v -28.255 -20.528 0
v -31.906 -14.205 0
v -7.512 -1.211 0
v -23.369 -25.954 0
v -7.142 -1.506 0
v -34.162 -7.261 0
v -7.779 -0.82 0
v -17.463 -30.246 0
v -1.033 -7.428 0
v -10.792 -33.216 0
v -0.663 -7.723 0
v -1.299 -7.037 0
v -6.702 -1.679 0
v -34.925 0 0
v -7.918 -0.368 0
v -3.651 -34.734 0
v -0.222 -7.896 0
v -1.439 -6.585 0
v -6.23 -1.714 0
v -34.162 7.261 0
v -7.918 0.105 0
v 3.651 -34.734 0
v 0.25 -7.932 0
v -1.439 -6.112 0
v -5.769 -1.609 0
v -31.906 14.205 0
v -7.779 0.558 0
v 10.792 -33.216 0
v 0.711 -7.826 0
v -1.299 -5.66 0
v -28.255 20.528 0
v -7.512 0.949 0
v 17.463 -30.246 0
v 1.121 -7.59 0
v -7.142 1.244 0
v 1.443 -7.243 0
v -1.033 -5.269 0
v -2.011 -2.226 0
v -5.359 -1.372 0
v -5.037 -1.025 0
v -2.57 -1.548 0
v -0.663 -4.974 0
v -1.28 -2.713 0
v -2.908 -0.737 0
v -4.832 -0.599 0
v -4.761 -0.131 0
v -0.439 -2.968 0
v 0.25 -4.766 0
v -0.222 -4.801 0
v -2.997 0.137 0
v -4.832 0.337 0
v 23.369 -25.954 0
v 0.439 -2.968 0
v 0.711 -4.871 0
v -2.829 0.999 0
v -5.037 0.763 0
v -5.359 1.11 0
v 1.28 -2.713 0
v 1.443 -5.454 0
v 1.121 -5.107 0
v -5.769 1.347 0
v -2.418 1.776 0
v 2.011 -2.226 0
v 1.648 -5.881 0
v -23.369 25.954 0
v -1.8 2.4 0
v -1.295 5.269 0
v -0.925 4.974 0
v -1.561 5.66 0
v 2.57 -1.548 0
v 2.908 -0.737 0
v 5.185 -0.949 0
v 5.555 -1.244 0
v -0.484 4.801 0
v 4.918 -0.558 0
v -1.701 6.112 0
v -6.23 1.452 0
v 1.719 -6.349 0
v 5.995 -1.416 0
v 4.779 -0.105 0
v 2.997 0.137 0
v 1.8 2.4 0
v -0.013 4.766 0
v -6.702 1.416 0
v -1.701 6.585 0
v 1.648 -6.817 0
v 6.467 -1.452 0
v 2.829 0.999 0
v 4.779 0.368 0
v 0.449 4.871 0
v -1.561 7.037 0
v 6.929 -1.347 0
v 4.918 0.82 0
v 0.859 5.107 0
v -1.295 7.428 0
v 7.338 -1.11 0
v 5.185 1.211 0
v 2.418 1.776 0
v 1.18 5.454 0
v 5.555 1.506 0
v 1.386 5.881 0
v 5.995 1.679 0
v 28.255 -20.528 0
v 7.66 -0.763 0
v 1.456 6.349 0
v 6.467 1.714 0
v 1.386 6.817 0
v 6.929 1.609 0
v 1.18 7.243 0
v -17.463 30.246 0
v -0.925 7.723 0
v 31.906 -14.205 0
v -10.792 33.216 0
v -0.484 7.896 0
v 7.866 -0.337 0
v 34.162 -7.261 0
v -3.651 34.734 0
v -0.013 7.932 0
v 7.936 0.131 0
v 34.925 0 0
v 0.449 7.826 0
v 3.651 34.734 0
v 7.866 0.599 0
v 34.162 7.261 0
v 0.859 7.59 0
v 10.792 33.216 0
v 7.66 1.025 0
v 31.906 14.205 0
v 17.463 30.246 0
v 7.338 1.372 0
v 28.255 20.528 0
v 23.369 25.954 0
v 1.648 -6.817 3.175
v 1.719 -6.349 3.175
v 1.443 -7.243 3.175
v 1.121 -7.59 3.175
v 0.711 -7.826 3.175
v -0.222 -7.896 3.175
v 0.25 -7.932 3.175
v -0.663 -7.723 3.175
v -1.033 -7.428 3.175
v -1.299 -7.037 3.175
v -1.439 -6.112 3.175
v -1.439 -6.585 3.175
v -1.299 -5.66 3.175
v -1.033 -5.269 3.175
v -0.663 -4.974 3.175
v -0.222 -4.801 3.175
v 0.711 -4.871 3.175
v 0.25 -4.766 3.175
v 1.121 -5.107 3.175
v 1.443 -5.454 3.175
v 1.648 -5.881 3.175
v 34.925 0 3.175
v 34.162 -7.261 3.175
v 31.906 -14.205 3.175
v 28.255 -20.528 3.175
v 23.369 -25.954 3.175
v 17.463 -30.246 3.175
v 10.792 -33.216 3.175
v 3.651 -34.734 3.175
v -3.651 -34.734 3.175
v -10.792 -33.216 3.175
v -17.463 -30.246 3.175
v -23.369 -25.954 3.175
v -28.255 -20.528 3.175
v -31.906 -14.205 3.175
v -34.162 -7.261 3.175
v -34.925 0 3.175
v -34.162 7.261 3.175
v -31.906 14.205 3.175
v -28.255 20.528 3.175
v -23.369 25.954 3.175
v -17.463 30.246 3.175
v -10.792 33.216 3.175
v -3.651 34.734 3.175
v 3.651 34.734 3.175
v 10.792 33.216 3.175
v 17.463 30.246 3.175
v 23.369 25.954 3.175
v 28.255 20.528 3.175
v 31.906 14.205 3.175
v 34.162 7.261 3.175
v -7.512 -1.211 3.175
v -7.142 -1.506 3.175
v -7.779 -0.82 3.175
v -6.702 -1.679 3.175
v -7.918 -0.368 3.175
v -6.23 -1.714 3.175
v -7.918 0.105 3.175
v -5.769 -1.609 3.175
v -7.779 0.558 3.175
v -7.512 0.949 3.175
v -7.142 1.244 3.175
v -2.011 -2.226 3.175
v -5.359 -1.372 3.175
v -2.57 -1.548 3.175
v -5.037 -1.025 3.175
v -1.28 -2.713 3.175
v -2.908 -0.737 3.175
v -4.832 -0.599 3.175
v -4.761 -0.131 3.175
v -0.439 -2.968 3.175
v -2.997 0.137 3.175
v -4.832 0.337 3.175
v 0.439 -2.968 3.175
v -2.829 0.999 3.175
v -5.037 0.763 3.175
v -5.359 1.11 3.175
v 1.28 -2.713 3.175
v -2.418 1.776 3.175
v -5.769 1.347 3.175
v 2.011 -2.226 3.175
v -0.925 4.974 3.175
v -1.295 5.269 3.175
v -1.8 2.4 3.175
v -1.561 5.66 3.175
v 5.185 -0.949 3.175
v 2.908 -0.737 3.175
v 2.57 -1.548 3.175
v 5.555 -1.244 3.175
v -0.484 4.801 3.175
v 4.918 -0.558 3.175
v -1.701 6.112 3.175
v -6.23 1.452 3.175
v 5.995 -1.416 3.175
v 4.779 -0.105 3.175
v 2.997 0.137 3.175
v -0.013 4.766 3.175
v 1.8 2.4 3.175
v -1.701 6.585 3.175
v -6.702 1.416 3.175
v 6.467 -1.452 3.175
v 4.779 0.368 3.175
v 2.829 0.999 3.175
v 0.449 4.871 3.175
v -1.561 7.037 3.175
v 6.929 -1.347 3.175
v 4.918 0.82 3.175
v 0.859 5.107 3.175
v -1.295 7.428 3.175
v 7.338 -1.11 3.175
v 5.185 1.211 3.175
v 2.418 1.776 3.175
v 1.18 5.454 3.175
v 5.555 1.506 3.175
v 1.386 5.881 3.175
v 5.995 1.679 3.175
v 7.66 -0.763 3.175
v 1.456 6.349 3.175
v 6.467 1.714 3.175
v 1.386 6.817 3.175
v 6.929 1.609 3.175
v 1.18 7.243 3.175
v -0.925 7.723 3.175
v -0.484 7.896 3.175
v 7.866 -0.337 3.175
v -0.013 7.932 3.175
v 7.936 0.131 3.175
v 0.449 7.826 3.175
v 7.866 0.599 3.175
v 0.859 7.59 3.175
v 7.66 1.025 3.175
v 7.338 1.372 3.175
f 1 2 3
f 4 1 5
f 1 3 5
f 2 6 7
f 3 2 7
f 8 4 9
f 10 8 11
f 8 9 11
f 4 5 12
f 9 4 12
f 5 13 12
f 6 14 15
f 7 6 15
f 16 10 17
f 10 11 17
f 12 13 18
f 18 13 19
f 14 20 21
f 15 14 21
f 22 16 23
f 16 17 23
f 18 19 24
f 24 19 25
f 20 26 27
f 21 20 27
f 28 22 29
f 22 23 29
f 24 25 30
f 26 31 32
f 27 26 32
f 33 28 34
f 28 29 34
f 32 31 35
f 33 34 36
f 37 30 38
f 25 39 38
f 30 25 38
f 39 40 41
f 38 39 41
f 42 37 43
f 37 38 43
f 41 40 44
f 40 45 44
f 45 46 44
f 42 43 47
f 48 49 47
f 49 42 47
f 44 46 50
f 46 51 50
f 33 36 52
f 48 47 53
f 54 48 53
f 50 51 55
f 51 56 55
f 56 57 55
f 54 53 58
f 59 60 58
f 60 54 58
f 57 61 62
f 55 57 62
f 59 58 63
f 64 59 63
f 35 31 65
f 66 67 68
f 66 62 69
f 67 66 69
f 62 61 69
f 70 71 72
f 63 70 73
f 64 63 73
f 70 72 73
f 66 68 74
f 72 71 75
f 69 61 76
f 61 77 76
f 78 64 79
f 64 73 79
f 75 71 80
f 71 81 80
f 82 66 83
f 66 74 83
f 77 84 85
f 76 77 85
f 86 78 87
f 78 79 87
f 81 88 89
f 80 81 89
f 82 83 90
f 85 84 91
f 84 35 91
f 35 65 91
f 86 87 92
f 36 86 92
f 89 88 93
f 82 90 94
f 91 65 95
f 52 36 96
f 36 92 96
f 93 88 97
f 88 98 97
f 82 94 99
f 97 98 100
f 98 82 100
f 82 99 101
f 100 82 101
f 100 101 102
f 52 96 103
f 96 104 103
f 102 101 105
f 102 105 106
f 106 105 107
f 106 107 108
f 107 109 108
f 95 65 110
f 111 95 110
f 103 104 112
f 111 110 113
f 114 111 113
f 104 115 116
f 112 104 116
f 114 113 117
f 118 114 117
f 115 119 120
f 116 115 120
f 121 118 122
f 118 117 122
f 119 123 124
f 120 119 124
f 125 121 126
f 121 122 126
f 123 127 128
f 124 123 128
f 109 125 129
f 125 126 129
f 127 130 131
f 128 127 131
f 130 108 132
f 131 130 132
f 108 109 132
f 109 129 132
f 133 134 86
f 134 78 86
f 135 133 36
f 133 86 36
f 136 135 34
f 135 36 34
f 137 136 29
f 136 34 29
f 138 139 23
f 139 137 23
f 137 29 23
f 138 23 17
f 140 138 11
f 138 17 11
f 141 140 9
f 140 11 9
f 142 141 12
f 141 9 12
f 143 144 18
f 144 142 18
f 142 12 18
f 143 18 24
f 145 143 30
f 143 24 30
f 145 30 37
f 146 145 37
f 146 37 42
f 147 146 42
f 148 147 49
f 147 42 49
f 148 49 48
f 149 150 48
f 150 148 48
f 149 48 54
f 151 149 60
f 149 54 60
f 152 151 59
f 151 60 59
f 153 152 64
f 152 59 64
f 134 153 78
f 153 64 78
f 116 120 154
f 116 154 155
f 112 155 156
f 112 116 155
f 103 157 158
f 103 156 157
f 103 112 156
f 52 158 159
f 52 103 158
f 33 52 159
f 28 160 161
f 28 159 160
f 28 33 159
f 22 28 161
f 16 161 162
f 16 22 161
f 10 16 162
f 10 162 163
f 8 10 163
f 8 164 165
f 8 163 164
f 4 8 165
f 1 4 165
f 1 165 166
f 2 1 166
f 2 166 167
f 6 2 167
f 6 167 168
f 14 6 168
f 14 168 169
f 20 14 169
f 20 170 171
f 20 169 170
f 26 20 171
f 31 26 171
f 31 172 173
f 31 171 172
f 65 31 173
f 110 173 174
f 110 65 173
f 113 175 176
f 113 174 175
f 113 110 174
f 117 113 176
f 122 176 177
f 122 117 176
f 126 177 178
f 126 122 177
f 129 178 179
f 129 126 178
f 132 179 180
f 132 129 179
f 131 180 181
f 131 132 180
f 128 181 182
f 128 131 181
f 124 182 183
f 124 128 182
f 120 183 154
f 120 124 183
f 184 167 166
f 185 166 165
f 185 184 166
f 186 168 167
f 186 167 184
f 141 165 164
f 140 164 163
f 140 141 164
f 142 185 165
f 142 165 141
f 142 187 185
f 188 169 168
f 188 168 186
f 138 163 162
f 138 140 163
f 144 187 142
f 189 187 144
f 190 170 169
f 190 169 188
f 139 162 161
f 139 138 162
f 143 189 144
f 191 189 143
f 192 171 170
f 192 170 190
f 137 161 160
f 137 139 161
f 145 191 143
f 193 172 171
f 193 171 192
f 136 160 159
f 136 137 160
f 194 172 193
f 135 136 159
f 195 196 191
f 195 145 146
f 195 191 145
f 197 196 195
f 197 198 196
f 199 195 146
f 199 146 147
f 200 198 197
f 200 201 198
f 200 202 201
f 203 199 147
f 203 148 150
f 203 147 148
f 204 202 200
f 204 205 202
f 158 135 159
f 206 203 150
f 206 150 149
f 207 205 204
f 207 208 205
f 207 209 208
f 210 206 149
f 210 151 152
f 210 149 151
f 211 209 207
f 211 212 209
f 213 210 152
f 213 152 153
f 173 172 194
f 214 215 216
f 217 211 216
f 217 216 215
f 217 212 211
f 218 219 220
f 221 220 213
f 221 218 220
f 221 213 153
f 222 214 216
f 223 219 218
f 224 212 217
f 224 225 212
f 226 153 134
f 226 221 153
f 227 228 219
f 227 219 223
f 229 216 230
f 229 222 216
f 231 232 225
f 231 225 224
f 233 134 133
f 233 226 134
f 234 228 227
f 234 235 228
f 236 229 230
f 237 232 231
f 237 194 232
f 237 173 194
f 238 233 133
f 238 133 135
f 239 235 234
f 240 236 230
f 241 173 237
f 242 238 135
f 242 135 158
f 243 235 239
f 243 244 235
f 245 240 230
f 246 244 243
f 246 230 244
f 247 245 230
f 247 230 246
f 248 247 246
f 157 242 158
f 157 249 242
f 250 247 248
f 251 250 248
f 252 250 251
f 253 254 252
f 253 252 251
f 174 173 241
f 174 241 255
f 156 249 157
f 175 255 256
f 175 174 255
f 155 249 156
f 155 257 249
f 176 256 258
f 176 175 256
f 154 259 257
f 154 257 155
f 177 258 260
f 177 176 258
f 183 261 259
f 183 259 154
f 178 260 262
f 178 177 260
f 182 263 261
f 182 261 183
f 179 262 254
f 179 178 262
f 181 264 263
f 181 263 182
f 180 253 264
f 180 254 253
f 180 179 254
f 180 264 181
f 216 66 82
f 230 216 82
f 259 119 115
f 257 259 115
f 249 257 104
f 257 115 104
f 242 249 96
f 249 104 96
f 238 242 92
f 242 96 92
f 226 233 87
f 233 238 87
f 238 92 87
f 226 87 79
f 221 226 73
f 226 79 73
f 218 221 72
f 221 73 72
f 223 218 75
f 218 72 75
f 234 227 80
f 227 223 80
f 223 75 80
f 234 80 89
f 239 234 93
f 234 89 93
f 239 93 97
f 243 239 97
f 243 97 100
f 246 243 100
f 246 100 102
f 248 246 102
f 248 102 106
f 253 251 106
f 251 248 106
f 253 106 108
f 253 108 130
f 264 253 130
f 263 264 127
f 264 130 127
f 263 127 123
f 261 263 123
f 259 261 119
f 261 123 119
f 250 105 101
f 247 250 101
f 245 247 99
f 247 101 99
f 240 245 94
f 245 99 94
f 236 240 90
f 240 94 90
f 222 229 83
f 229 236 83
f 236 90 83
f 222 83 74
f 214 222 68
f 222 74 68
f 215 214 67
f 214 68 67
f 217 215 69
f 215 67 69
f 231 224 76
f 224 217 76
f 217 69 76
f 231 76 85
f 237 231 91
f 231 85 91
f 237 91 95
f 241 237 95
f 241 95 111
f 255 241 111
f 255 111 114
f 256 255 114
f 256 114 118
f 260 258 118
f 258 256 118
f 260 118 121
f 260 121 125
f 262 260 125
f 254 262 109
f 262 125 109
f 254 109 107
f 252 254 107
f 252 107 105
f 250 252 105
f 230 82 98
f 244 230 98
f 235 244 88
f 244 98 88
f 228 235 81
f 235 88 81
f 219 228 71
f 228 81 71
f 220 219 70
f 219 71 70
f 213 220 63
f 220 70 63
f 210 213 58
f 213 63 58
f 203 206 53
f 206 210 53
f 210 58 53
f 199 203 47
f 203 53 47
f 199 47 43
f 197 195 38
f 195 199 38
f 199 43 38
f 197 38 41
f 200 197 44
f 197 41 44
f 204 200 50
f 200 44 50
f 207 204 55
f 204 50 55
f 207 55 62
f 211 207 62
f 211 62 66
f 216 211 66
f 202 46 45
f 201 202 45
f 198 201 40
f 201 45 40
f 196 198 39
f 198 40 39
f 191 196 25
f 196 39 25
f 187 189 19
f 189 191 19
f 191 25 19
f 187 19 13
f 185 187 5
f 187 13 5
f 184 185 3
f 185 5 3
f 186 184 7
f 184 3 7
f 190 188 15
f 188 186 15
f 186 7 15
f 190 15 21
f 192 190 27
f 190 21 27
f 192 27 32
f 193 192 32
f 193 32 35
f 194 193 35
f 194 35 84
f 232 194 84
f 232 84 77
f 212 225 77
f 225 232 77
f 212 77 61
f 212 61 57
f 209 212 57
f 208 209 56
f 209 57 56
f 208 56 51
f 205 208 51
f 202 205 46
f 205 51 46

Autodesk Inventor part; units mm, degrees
ref_plane "YZ Plane" through (0, 0, 0) normal (1, 0, 0) x (0, 1, 0)
ref_plane "XZ Plane" through (0, 0, 0) normal (0, 1, 0) x (-1, 0, 0)
ref_plane "XY Plane" through (0, 0, 0) normal (0, 0, 1) x (1, 0, 0)
ref_plane "Work Plane1" through (0, 0, 0) normal (0, 0, 1) x (1, 0, 0)
sketch "Sketch1" plane through (0, 0, 0) normal (0, 0, 1) x (1, 0, 0)
  circle A0 centre (-0.1312, 6.3486) radius 1.5875
  circle A1 centre (6.3486, 0.1312) radius 1.5875
  circle A2 centre (0.1312, -6.3486) radius 1.5875
  circle A3 centre (-6.3486, -0.1312) radius 1.5875
  arc A4 (-1.8, 2.4) -> (1.8, 2.4) centre (0, 0) ccw
  arc A5 (-10.2062, 24.6399) -> (-9.5905, 18.6316) centre (10.2722, 23.7027) ccw
  arc A6 (-9.5905, 18.6316) -> (-11.0963, 17.7759) centre (0, 0) ccw
  arc A7 (-11.0963, 17.7759) -> (-15.9426, 21.3804) centre (-25.6201, 3.3086) ccw
  arc A8 (-15.9426, 21.3804) -> (-17.6537, 19.9909) centre (0, 0) ccw
  arc A9 (-17.6537, 19.9909) -> (-15.1205, 14.508) centre (2.0194, 25.7538) ccw
  arc A10 (-15.1205, 14.508) -> (-16.2669, 13.2098) centre (0, 0) ccw
  arc A11 (-16.2669, 13.2098) -> (-22.021, 15.0454) centre (-25.3062, -5.1895) ccw
  arc A12 (-22.021, 15.0454) -> (-23.1882, 13.1756) centre (0, 0) ccw
  arc A13 (-23.1882, 13.1756) -> (-19.012, 8.8123) centre (-6.4522, 25.0141) ccw
  arc A14 (-19.012, 8.8123) -> (-19.6747, 7.2122) centre (0, 0) ccw
  arc A15 (-19.6747, 7.2122) -> (-25.7131, 7.08) centre (-22.2501, -13.1252) ccw
  arc A16 (-25.7131, 7.08) -> (-26.2099, 4.9325) centre (0, 0) ccw
  arc A17 (-26.2099, 4.9325) -> (-20.8432, 2.1617) centre (-14.2247, 21.5637) ccw
  arc A18 (-20.8432, 2.1617) -> (-20.9505, 0.4331) centre (0, 0) ccw
  arc A19 (-20.9505, 0.4331) -> (-26.6187, -1.6526) centre (-16.7827, -19.6386) ccw
  arc A20 (-26.6187, -1.6526) -> (-26.3914, -3.8451) centre (0, 0) ccw
  arc A21 (-26.3914, -3.8451) -> (-20.4158, -4.7232) centre (-20.4557, 15.7766) ccw
  arc A22 (-20.4158, -4.7232) -> (-19.956, -6.393) centre (0, 0) ccw
  arc A23 (-19.956, -6.393) -> (-24.6399, -10.2062) centre (-9.4967, -24.0239) ccw
  arc A24 (-24.6399, -10.2062) -> (-23.7129, -12.2061) centre (0, 0) ccw
  arc A25 (-23.7129, -12.2061) -> (-17.7759, -11.0963) centre (-24.47, 8.2798) ccw
  arc A26 (-17.7759, -11.0963) -> (-16.7989, -12.5263) centre (0, 0) ccw
  arc A27 (-16.7989, -12.5263) -> (-19.9909, -17.6537) centre (-1.1816, -25.8058) ccw
  arc A28 (-19.9909, -17.6537) -> (-18.4648, -19.2443) centre (0, 0) ccw
  arc A29 (-18.4648, -19.2443) -> (-13.2098, -16.2669) centre (-25.8326, -0.1142) ccw
  arc A30 (-13.2098, -16.2669) -> (-11.8214, -17.3022) centre (0, 0) ccw
  arc A31 (-11.8214, -17.3022) -> (-13.1756, -23.1882) centre (7.2615, -24.7913) ccw
  arc A32 (-13.1756, -23.1882) -> (-11.2157, -24.197) centre (0, 0) ccw
  arc A33 (-11.2157, -24.197) -> (-7.2122, -19.6747) centre (-24.3958, -8.4958) ccw
  arc A34 (-7.2122, -19.6747) -> (-5.5629, -20.2031) centre (0, 0) ccw
  arc A35 (-5.5629, -20.2031) -> (-4.9325, -26.2099) centre (14.9178, -21.0902) ccw
  arc A36 (-4.9325, -26.2099) -> (-2.7512, -26.5277) centre (0, 0) ccw
  arc A37 (-2.7512, -26.5277) -> (-0.4331, -20.9505) centre (-20.3154, -15.9568) ccw
  arc A38 (-0.4331, -20.9505) -> (1.2985, -20.9147) centre (0, 0) ccw
  arc A39 (1.2985, -20.9147) -> (3.8451, -26.3914) centre (20.9575, -15.1037) ccw
  arc A40 (3.8451, -26.3914) -> (6.0114, -25.9837) centre (0, 0) ccw
  arc A41 (6.0114, -25.9837) -> (6.393, -19.956) centre (-14.0335, -21.6886) ccw
  arc A42 (6.393, -19.956) -> (8.0191, -19.3599) centre (0, 0) ccw
  arc A43 (8.0191, -19.3599) -> (12.2061, -23.7129) centre (24.7261, -7.4804) ccw
  arc A44 (12.2061, -23.7129) -> (14.1226, -22.6239) centre (0, 0) ccw
  arc A45 (14.1226, -22.6239) -> (12.5263, -16.7989) centre (-6.2308, -25.0702) ccw
  arc A46 (12.5263, -16.7989) -> (13.8708, -15.7071) centre (0, 0) ccw
  arc A47 (13.8708, -15.7071) -> (19.2443, -18.4648) centre (25.8152, 0.9534) ccw
  arc A48 (19.2443, -18.4648) -> (20.7033, -16.8125) centre (0, 0) ccw
  arc A49 (20.7033, -16.8125) -> (17.3022, -11.8214) centre (2.2471, -25.7349) ccw
  arc A50 (17.3022, -11.8214) -> (18.2193, -10.3522) centre (0, 0) ccw
  arc A51 (18.2193, -10.3522) -> (24.197, -11.2157) centre (24.1069, 9.284) ccw
  arc A52 (24.197, -11.2157) -> (25.0406, -9.1792) centre (0, 0) ccw
  arc A53 (25.0406, -9.1792) -> (20.2031, -5.5629) centre (10.4814, -23.6109) ccw
  arc A54 (20.2031, -5.5629) -> (20.5935, -3.8755) centre (0, 0) ccw
  arc A55 (20.5935, -3.8755) -> (26.5277, -2.7512) centre (19.7863, 16.6084) ccw
  arc A56 (26.5277, -2.7512) -> (26.6643, -0.5512) centre (0, 0) ccw
  arc A57 (26.6643, -0.5512) -> (20.9147, 1.2985) centre (17.58, -18.9283) ccw
  arc A58 (20.9147, 1.2985) -> (20.7361, 3.0212) centre (0, 0) ccw
  arc A59 (20.7361, 3.0212) -> (25.9837, 6.0114) centre (13.3214, 22.1331) ccw
  arc A60 (25.9837, 6.0114) -> (25.3985, 8.1366) centre (0, 0) ccw
  arc A61 (25.3985, 8.1366) -> (19.3599, 8.0191) centre (22.7734, -12.1945) ccw
  arc A62 (19.3599, 8.0191) -> (18.6316, 9.5905) centre (0, 0) ccw
  arc A63 (18.6316, 9.5905) -> (22.6239, 14.1226) centre (5.413, 25.2594) ccw
  arc A64 (22.6239, 14.1226) -> (21.3804, 15.9426) centre (0, 0) ccw
  arc A65 (21.3804, 15.9426) -> (15.7071, 13.8708) centre (25.4991, -4.1393) ccw
  arc A66 (15.7071, 13.8708) -> (14.508, 15.1205) centre (0, 0) ccw
  arc A67 (14.508, 15.1205) -> (16.8125, 20.7033) centre (-3.082, 25.6483) ccw
  arc A68 (16.8125, 20.7033) -> (15.0454, 22.021) centre (0, 0) ccw
  arc A69 (15.0454, 22.021) -> (10.3522, 18.2193) centre (25.4615, 4.3646) ccw
  arc A70 (10.3522, 18.2193) -> (8.8123, 19.012) centre (0, 0) ccw
  arc A71 (8.8123, 19.012) -> (9.1792, 25.0406) centre (-11.243, 23.2579) ccw
  arc A72 (9.1792, 25.0406) -> (7.08, 25.7131) centre (0, 0) ccw
  arc A73 (7.08, 25.7131) -> (3.8755, 20.5935) centre (22.6647, 12.3954) ccw
  arc A74 (3.8755, 20.5935) -> (2.1617, 20.8432) centre (0, 0) ccw
  arc A75 (2.1617, 20.8432) -> (0.5512, 26.6643) centre (-18.1856, 18.3472) ccw
  arc A76 (0.5512, 26.6643) -> (-1.6526, 26.6187) centre (0, 0) ccw
  arc A77 (-1.6526, 26.6187) -> (-3.0212, 20.7361) centre (17.4119, 19.083) ccw
  arc A78 (-3.0212, 20.7361) -> (-4.7232, 20.4158) centre (0, 0) ccw
  arc A79 (-4.7232, 20.4158) -> (-8.1366, 25.3985) centre (-23.1576, 11.4482) ccw
  arc A80 (-8.1366, 25.3985) -> (-10.2062, 24.6399) centre (0, 0) ccw
  circle A81 centre (0, 0) radius 34.925
  line L0 (-3.1504, 2.4) -> (-1.8, 2.4)
  line L1 (1.8, 2.4) -> (3.3261, 2.4)
  line L2 (-1.8, 2.4) -> (1.8, 2.4)
  point P0 (0.0879, -3)
  dimension "d0" = 69.85
  dimension "d3" = 6
  dimension "d4" = 5.4
extrude "Extrusion1" add sketch "Sketch1" along normal blind 3.175 contours A80 A79 A78 A77 A76 A75 A74 A73 A72 A71 A70 A69 A68 A67 A66 A65 A64 A63 A62 A61 A60 A59 A58 A57 A56 A55 A54 A53 A52 A51 A50 A49 A48 A47 A46 A45 A44 A43 A42 A41 A40 A39 A38 A37 A36 A35 A34 A33 A32 A31 A30 A29 A28 A27 A26 A25 A24 A23 A22 A21 A20 A19 A18 A17 A16 A15 A14 A13 A12 A11 A10 A9 A8 A7 A6 A5 | A81
properties part number "gearGuideRings"
